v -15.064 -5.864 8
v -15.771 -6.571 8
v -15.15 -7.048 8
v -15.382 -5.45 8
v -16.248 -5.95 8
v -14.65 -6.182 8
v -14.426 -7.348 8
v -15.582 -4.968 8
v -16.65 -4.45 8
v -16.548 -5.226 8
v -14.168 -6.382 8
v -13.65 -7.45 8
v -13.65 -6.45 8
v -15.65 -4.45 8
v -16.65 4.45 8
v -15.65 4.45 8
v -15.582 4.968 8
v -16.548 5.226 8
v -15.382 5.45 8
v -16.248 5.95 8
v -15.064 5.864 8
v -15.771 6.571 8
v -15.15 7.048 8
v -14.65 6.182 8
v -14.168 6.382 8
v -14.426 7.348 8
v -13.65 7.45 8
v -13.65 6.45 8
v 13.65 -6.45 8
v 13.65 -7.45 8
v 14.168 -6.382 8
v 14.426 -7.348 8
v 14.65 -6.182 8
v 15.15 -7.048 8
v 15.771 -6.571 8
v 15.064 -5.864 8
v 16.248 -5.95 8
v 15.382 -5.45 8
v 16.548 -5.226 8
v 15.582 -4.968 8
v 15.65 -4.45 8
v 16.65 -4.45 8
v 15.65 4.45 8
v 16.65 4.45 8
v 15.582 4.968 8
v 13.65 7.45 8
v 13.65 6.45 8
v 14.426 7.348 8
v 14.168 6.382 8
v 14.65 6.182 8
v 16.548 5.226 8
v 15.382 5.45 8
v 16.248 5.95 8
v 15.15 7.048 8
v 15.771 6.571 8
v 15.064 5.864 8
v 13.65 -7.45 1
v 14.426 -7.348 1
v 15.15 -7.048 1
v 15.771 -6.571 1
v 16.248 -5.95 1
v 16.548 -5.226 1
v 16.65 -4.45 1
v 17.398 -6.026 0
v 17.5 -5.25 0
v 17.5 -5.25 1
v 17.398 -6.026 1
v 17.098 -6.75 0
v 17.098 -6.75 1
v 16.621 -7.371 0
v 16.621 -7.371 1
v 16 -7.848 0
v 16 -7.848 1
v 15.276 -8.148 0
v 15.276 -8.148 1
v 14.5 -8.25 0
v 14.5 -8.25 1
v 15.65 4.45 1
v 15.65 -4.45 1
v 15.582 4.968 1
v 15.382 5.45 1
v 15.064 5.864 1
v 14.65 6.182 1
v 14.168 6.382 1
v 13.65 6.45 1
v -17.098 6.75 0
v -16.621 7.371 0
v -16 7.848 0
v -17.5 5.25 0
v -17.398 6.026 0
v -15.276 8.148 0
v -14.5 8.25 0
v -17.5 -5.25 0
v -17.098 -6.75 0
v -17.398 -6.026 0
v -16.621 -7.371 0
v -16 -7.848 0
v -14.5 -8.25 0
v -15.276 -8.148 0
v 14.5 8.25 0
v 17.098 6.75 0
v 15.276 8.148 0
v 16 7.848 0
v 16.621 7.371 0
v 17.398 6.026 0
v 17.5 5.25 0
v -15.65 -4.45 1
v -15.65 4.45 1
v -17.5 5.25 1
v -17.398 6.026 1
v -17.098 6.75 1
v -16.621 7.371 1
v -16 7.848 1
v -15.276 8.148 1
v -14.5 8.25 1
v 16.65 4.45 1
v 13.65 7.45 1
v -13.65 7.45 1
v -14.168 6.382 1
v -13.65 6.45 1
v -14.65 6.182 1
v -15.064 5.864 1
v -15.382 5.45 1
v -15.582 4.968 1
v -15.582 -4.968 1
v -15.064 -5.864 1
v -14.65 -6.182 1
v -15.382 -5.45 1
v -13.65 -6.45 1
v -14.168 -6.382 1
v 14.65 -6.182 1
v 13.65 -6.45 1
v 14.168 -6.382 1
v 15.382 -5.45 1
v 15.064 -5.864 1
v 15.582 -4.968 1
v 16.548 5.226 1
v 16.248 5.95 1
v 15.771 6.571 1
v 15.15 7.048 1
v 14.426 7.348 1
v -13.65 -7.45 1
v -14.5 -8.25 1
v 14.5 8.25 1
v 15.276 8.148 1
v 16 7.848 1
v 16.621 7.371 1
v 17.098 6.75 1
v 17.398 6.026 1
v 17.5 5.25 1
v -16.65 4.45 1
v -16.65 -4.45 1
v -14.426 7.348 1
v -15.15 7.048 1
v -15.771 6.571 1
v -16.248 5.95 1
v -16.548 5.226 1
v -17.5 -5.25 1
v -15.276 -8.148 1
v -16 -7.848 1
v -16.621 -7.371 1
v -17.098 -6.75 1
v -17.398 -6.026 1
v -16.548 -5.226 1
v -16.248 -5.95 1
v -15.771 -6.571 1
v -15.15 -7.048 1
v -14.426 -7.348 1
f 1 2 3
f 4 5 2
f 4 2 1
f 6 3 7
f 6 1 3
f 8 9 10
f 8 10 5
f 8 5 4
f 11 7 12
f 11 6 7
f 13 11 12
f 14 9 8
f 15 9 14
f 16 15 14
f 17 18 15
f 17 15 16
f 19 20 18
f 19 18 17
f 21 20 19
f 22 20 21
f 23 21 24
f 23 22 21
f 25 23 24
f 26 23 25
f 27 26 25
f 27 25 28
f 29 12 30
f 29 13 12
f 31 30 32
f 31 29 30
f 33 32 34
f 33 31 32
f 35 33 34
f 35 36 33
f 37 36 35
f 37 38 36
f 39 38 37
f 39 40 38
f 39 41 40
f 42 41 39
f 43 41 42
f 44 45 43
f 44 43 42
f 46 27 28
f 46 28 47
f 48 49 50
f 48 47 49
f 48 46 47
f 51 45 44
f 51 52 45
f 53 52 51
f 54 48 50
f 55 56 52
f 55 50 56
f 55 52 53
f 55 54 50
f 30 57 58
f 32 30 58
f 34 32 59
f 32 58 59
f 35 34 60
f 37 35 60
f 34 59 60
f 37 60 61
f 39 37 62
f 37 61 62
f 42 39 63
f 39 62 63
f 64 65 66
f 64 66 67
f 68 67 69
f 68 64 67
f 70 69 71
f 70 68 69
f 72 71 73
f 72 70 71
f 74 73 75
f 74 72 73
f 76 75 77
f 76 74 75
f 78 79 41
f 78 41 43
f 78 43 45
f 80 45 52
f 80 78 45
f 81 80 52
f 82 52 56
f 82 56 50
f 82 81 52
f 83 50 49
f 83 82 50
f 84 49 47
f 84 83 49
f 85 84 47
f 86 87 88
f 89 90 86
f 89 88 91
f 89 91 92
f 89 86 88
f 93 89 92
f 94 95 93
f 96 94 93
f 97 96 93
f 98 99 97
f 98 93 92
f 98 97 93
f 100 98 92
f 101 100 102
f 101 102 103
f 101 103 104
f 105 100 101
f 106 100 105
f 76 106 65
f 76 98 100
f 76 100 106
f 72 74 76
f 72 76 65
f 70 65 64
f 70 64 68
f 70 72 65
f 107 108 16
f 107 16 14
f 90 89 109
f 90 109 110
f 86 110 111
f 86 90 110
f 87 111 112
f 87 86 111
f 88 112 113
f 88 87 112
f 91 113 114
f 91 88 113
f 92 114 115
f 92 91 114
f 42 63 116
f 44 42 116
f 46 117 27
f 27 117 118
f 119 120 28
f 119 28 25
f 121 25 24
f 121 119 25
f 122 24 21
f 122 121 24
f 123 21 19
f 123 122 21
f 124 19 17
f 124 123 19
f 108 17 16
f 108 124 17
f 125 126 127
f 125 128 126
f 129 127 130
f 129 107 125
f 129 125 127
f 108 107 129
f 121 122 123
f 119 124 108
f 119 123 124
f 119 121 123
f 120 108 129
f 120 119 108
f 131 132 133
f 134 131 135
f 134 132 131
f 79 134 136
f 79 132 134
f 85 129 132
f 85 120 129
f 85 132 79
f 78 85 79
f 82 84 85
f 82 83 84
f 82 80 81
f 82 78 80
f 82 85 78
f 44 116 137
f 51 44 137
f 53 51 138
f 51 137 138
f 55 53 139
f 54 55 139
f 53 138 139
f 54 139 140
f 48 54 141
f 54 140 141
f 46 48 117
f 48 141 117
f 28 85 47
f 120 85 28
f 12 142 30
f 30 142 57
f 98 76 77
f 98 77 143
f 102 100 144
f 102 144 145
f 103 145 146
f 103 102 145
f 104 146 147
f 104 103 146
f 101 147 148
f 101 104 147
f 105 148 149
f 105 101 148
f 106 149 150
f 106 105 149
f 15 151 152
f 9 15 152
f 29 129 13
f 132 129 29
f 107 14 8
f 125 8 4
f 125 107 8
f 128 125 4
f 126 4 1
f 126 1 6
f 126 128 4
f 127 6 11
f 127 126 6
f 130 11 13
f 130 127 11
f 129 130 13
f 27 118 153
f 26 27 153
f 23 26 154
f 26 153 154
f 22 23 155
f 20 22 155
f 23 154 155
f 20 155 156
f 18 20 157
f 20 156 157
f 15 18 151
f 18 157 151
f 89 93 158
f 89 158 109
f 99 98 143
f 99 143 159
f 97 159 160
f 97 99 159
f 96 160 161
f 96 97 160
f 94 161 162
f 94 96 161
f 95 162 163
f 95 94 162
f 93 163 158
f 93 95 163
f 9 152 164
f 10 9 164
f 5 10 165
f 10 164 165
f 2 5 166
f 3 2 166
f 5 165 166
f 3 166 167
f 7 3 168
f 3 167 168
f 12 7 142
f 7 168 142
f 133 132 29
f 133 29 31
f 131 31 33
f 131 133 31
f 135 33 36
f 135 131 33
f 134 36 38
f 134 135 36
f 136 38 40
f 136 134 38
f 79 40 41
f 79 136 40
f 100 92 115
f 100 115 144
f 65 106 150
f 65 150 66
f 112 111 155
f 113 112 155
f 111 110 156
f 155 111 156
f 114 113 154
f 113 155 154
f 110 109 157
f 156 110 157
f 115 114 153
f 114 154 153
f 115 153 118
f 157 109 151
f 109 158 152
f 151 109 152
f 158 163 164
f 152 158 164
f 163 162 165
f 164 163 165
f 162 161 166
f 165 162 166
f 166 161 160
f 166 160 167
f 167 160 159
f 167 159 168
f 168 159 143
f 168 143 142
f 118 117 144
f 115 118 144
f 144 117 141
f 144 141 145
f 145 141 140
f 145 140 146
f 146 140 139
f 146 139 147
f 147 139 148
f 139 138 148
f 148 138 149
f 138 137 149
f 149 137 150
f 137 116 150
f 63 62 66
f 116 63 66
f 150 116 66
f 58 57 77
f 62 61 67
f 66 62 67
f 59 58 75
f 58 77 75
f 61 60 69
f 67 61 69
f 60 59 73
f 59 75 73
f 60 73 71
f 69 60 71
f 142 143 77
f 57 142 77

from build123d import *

# Parameters (mm, degrees)
F1_DEPTH = 8
F2_T     = -1
F4_DEPTH = 1


with BuildPart() as f1:
    # F0 (on Top) → F1 (new body)
    with BuildSketch(Plane.XY):
        with BuildLine():
            Line((-13.65, -7.45), (13.65, -7.45))
            ThreePointArc((13.65, -7.45), (15.7713203436, -6.5713203436), (16.65, -4.45))
            Line((16.65, -4.45), (16.65, 4.45))
            ThreePointArc((16.65, 4.45), (15.7713203436, 6.5713203436), (13.65, 7.45))
            Line((13.65, 7.45), (-13.65, 7.45))
            ThreePointArc((-13.65, 7.45), (-15.7713203436, 6.5713203436), (-16.65, 4.45))
            Line((-16.65, 4.45), (-16.65, -4.45))
            ThreePointArc((-16.65, -4.45), (-15.7713203436, -6.5713203436), (-13.65, -7.45))
        make_face()
    extrude(amount=F1_DEPTH)

    # F2
    f2_openings = [f1.faces().sort_by_distance(p)[0] for p in [
        (0, 0, 8),
    ]]
    offset(amount=F2_T, openings=f2_openings)

    # F3 (on face) → F4 (join)
    with BuildSketch(Plane(origin=(0, 0, 0), x_dir=(1, 0, 0), z_dir=(0, 0, -1))):
        with BuildLine():
            Line((-14.5, -8.25), (14.5, -8.25))
            ThreePointArc((14.5, -8.25), (16.6213203436, -7.3713203436), (17.5, -5.25))
            Line((17.5, -5.25), (17.5, 5.25))
            ThreePointArc((17.5, 5.25), (16.6213203436, 7.3713203436), (14.5, 8.25))
            Line((14.5, 8.25), (-14.5, 8.25))
            ThreePointArc((-14.5, 8.25), (-16.6213203436, 7.3713203436), (-17.5, 5.25))
            Line((-17.5, 5.25), (-17.5, -5.25))
            ThreePointArc((-17.5, -5.25), (-16.6213203436, -7.3713203436), (-14.5, -8.25))
        make_face()
        with BuildLine():
            Line((-13.65, 7.45), (13.65, 7.45))
            ThreePointArc((13.65, 7.45), (15.7713203436, 6.5713203436), (16.65, 4.45))
            Line((16.65, 4.45), (16.65, -4.45))
            ThreePointArc((16.65, -4.45), (15.7713203436, -6.5713203436), (13.65, -7.45))
            Line((13.65, -7.45), (-13.65, -7.45))
            ThreePointArc((-13.65, -7.45), (-15.7713203436, -6.5713203436), (-16.65, -4.45))
            Line((-16.65, -4.45), (-16.65, 4.45))
            ThreePointArc((-16.65, 4.45), (-15.7713203436, 6.5713203436), (-13.65, 7.45))
        make_face(mode=Mode.SUBTRACT)
    extrude(amount=-F4_DEPTH)


solid = f1.part
